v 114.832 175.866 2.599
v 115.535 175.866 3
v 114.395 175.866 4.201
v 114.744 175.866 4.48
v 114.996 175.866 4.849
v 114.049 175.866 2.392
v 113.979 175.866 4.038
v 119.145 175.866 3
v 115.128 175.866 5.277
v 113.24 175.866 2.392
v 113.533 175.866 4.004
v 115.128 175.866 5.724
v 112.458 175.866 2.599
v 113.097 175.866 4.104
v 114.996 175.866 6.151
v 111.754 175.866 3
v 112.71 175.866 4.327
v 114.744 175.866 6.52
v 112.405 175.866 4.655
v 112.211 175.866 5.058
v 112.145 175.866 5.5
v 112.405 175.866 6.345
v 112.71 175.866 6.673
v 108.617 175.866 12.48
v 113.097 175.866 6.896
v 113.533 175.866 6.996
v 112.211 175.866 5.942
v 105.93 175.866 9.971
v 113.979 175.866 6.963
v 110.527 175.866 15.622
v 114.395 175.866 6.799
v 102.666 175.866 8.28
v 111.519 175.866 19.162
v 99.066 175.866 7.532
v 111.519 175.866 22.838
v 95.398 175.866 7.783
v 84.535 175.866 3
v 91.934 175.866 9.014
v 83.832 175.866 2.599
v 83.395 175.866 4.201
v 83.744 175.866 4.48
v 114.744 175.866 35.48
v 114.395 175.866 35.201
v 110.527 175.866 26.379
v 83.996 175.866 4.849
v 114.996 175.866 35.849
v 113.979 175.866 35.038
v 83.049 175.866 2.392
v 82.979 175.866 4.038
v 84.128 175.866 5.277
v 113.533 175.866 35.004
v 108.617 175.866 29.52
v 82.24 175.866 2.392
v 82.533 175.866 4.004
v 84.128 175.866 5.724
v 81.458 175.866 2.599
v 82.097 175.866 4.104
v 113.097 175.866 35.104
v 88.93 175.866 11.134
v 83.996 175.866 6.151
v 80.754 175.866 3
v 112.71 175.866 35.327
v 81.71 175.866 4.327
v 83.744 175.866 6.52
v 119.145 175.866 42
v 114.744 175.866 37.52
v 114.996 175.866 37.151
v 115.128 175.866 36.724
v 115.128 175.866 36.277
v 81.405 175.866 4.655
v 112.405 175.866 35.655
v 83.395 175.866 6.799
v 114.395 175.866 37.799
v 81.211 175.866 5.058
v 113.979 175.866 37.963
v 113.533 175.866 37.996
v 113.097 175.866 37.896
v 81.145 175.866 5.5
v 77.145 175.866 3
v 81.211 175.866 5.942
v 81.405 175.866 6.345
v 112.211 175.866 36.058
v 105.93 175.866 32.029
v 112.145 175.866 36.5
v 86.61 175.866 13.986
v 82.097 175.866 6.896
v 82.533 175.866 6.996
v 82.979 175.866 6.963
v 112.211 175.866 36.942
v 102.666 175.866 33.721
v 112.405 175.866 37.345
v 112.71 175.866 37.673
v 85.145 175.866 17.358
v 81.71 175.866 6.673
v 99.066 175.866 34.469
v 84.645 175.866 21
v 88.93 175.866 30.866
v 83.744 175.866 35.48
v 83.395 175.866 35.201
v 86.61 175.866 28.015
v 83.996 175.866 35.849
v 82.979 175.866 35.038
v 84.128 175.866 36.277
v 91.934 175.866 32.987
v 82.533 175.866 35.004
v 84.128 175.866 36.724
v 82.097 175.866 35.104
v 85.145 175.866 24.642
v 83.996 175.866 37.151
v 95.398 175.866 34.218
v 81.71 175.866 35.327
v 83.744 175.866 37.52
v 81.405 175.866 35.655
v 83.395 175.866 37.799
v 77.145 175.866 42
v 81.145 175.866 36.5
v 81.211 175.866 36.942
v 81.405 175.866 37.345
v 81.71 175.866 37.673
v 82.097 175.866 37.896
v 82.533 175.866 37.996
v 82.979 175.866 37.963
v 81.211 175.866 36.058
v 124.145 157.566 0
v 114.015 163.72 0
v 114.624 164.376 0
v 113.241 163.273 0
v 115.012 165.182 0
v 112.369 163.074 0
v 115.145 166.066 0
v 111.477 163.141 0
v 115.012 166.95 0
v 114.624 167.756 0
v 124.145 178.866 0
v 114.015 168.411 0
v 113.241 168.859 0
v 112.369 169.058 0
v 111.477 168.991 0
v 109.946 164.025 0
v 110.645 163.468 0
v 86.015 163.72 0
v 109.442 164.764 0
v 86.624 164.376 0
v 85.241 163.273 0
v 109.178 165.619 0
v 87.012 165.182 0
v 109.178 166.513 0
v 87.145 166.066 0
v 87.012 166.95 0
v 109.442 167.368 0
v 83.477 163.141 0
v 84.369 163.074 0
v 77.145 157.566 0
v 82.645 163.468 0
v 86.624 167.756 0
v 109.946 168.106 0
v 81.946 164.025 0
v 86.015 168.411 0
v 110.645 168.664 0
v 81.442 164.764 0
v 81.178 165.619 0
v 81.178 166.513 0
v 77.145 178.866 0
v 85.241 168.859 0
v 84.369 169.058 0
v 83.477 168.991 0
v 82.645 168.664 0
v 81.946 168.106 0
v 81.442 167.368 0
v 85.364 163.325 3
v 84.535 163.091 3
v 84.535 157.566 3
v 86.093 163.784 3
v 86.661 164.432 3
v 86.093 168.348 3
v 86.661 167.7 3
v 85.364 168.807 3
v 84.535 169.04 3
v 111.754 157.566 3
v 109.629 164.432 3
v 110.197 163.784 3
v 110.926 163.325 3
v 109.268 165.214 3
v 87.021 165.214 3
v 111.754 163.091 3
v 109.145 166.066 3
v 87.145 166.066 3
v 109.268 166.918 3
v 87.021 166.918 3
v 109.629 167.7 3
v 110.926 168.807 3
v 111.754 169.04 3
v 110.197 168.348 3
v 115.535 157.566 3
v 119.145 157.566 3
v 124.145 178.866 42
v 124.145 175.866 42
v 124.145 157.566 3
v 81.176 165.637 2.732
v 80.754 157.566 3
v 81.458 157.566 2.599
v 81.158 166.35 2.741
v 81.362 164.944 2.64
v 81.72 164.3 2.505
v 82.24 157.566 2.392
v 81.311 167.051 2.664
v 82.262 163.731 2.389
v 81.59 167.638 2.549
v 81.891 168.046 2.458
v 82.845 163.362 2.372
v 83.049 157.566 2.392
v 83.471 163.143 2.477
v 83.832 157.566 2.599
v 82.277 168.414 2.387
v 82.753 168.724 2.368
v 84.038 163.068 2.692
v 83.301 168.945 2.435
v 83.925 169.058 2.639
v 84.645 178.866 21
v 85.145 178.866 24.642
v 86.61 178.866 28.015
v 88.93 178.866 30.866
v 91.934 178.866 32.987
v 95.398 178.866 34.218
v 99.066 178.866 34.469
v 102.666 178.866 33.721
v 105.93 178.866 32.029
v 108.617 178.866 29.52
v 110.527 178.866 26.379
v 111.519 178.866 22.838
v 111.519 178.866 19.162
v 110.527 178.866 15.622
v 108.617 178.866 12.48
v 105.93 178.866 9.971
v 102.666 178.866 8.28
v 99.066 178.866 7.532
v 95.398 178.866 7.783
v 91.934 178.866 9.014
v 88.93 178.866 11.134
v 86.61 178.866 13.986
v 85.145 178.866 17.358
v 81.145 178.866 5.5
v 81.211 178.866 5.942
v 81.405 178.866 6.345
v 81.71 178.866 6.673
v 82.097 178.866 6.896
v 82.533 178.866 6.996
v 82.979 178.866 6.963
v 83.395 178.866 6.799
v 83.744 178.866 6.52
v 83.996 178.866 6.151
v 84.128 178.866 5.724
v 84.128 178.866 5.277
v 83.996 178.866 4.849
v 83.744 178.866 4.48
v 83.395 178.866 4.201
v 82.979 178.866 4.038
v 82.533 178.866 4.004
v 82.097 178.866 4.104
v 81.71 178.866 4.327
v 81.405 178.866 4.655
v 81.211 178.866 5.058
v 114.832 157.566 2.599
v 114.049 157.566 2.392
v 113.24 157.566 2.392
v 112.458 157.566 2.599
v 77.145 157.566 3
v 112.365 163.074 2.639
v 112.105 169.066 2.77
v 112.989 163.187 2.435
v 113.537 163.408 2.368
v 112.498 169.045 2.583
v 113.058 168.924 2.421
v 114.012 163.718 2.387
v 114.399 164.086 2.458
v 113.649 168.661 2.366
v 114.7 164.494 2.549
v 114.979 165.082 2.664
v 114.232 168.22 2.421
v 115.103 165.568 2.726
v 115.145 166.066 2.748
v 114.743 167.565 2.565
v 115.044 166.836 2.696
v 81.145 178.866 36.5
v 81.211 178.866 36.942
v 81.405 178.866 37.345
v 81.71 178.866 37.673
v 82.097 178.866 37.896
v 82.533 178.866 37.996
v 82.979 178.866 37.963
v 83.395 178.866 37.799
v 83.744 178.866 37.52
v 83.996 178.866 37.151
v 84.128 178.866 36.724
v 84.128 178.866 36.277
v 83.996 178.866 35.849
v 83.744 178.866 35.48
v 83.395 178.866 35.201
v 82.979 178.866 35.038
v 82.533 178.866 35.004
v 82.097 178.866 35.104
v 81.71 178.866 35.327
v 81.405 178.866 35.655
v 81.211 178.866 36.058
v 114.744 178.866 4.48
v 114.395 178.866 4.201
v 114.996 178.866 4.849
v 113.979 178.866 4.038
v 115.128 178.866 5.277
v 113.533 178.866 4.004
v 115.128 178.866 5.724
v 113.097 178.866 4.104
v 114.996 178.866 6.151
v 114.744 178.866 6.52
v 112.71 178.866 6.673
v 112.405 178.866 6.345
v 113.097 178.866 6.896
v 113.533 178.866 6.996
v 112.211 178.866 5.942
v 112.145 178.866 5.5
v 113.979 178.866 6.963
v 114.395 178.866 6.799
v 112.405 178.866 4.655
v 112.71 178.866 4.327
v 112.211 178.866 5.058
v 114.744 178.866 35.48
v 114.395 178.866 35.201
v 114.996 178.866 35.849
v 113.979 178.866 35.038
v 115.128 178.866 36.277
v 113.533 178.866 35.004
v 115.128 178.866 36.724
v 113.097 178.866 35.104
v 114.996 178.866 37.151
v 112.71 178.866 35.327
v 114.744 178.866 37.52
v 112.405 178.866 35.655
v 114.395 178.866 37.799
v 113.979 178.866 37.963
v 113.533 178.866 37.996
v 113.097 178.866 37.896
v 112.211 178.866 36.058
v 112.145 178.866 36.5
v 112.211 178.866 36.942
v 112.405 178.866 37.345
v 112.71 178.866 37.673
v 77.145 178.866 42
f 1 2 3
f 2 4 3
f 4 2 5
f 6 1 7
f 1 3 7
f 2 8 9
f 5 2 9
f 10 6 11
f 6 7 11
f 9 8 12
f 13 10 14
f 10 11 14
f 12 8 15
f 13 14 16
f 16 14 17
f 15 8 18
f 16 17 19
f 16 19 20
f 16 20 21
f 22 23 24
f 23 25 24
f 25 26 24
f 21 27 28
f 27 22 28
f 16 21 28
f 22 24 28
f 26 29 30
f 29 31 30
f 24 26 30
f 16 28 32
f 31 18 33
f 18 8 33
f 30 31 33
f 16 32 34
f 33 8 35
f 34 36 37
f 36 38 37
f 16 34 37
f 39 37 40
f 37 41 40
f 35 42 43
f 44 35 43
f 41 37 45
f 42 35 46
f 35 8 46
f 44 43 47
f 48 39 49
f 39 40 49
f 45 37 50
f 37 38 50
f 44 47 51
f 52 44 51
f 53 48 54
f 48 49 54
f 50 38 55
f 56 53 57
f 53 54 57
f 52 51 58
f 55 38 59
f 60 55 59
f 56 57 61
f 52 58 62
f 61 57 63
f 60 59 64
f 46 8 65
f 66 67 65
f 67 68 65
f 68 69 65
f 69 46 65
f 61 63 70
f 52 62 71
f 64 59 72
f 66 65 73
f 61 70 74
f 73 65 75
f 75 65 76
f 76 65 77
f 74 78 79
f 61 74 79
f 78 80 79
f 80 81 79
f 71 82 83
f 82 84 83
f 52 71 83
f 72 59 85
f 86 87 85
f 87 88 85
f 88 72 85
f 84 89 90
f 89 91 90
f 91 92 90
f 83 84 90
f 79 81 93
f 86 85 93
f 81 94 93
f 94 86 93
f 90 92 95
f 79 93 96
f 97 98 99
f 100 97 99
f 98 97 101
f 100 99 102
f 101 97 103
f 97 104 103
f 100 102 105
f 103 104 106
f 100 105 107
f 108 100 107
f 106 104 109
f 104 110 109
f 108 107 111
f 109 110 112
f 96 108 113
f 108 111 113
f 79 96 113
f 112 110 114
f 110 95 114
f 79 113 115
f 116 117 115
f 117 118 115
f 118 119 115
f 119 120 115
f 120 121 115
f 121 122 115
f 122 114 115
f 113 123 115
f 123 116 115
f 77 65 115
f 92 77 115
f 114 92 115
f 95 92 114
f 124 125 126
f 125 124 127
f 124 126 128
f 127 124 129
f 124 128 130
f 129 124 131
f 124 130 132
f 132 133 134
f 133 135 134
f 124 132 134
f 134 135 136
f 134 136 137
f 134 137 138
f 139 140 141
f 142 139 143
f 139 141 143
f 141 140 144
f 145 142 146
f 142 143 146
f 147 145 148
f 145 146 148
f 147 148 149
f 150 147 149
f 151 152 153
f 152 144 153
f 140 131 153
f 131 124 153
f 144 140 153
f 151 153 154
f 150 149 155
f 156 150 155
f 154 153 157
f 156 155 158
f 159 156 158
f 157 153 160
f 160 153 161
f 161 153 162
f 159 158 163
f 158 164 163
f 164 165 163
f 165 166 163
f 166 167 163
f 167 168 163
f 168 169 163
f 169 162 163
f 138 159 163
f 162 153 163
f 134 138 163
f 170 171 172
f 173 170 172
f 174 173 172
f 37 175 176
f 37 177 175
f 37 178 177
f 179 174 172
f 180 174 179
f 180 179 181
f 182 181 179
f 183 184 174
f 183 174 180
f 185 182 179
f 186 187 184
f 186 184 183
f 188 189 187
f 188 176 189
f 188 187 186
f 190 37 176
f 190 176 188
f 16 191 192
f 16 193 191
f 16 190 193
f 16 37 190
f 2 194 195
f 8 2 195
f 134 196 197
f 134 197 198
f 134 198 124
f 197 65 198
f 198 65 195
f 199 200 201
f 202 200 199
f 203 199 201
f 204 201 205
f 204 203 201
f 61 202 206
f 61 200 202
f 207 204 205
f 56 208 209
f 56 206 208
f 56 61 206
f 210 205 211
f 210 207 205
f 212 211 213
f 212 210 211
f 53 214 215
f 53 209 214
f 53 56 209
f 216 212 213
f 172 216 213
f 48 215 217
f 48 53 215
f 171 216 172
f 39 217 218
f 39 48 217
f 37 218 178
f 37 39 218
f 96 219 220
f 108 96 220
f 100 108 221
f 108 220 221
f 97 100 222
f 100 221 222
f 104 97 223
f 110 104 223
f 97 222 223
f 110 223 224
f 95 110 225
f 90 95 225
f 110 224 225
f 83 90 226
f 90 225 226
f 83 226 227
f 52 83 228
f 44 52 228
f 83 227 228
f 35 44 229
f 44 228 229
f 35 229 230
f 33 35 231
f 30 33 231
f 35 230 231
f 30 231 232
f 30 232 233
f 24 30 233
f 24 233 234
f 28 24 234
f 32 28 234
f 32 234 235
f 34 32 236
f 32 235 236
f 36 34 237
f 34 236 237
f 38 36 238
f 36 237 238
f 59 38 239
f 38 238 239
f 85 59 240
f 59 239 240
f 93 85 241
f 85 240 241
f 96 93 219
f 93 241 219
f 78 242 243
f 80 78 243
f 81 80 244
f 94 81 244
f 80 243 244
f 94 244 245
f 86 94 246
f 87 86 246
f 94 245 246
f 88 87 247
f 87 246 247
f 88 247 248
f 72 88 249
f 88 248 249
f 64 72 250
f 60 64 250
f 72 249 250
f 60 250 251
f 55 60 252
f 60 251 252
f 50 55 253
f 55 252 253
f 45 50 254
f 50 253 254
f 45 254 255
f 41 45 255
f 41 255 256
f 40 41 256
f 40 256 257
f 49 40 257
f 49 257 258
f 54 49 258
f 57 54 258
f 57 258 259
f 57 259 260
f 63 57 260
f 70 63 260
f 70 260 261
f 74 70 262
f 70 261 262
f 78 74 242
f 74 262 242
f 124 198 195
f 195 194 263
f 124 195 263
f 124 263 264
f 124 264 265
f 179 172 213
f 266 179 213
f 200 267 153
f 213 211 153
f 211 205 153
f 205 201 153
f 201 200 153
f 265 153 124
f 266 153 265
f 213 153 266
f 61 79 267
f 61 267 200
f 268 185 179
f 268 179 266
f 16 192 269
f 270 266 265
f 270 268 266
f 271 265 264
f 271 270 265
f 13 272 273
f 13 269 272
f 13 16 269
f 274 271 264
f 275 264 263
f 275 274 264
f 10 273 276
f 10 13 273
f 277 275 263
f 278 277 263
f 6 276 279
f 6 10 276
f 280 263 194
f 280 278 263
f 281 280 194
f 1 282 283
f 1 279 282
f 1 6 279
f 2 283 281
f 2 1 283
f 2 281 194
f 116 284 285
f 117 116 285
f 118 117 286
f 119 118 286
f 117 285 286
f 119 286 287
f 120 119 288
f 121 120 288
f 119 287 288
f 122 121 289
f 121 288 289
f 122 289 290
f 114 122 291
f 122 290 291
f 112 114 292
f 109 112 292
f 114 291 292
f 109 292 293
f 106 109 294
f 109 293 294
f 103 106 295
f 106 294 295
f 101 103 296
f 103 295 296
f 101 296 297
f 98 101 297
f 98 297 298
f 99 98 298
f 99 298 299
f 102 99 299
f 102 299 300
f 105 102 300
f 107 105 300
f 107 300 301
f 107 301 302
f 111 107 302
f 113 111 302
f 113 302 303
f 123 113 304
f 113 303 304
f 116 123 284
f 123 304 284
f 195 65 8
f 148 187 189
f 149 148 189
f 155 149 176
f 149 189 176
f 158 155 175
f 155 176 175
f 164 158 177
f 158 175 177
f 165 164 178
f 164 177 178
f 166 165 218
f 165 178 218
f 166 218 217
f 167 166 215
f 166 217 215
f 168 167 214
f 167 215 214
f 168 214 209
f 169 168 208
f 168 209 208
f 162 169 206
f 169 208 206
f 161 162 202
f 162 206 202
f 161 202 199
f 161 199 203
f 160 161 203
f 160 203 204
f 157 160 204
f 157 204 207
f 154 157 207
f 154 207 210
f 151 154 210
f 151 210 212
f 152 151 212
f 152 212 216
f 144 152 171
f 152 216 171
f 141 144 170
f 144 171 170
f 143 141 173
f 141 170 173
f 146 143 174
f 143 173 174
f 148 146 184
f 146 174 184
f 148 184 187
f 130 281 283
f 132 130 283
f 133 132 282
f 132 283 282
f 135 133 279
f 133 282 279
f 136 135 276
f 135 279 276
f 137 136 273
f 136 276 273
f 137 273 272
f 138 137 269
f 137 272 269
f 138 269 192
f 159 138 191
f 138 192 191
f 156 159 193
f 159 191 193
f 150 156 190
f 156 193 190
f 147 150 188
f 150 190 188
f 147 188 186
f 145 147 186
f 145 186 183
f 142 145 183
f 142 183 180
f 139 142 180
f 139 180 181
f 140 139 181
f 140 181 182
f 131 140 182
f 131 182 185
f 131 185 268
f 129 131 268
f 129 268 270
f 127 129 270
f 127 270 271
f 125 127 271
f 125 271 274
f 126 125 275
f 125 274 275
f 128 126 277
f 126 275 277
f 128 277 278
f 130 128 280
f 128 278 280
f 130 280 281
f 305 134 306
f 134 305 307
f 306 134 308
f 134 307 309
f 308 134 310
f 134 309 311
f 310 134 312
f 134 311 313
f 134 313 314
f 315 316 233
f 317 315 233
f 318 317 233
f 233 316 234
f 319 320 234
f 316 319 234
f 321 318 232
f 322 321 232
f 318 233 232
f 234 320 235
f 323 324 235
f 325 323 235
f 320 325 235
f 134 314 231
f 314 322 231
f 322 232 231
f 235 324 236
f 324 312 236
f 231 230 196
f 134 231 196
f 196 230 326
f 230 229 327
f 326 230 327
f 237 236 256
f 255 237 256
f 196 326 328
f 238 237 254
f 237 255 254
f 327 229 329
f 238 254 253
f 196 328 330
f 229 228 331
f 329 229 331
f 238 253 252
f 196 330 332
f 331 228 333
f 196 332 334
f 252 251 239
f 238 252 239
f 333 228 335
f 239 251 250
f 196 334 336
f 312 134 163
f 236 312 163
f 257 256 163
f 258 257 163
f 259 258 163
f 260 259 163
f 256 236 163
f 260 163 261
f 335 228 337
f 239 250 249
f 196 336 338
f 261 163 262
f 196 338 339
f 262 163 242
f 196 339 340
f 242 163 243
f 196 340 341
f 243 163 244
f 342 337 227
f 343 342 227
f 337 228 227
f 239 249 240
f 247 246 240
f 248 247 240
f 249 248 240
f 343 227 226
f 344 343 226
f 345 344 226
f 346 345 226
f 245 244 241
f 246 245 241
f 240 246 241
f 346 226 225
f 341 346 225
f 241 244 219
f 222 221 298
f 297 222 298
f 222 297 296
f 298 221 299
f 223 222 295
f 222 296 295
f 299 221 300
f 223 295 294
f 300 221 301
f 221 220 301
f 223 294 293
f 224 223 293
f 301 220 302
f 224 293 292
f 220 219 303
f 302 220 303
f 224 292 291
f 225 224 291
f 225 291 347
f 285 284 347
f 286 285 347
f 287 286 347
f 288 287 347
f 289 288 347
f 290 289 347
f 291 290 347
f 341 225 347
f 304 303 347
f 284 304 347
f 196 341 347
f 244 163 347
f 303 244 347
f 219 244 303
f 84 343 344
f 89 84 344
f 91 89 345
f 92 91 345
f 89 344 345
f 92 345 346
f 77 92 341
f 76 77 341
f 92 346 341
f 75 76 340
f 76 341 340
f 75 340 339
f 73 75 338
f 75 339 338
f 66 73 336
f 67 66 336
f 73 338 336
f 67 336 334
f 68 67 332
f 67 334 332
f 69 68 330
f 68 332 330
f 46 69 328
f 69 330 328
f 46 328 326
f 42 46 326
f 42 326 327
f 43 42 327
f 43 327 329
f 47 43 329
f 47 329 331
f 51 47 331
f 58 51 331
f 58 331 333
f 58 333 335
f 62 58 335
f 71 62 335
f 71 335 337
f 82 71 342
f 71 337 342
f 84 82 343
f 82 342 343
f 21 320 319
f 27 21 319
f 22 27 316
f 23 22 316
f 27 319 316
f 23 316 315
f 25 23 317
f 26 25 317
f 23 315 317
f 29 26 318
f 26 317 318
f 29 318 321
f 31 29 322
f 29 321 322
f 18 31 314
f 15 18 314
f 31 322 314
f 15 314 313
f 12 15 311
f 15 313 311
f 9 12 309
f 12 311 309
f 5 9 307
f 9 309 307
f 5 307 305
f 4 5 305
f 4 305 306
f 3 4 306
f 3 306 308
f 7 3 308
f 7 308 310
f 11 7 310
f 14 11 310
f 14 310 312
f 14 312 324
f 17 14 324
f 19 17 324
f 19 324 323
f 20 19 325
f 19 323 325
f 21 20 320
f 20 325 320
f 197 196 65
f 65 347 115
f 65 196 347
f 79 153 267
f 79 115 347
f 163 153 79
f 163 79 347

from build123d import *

# Parameters (mm, degrees)
SKETCH1_W           = 42
SKETCH1_H           = 21.3
BOSS_EXTRUDE1_DEPTH = 3
SKETCH2_R           = 3
CUT_EXTRUDE1_DEPTH  = 3
SKETCH4_W           = 42
SKETCH4_H           = 42
SKETCH4_R           = 1.5
SKETCH4_R_2         = 13.5
BOSS_EXTRUDE2_DEPTH = 3
BOSS_EXTRUDE3_DEPTH = 5
SKETCH6_R           = 3.134349401
CUT_EXTRUDE2_DEPTH  = 20


with BuildPart() as part:
    # Sketch1 → Boss-Extrude1 (new body)
    with BuildSketch(Plane.XY):
        with Locations((98.144783915, 168.215968794)):
            Rectangle(SKETCH1_W, SKETCH1_H)
    extrude(amount=BOSS_EXTRUDE1_DEPTH)

    # Sketch2 → Cut-Extrude1 (cut)
    with BuildSketch(Plane.XY.offset(3)):
        with Locations((112.144783915, 166.065968794)):
            Circle(SKETCH2_R)
        with Locations((84.144783915, 166.065968794)):
            Circle(SKETCH2_R)
    extrude(amount=-CUT_EXTRUDE1_DEPTH, mode=Mode.SUBTRACT)

    # Sketch4 → Boss-Extrude2 (add)
    with BuildSketch(Plane(origin=(0, 178.865968794, 0), x_dir=(-1, 0, 0), z_dir=(0, 1, 0))):
        with Locations((-98.144783915, 21)):
            Rectangle(SKETCH4_W, SKETCH4_H)
        with Locations((-113.644783915, 36.500179206)):
            Circle(SKETCH4_R, mode=Mode.SUBTRACT)
        with Locations((-82.644783915, 36.500179206)):
            Circle(SKETCH4_R, mode=Mode.SUBTRACT)
        with Locations((-82.644783915, 5.500179206)):
            Circle(SKETCH4_R, mode=Mode.SUBTRACT)
        with Locations((-113.644783915, 5.500179206)):
            Circle(SKETCH4_R, mode=Mode.SUBTRACT)
        with Locations((-98.144783915, 21.000179206)):
            Circle(SKETCH4_R_2, mode=Mode.SUBTRACT)
    extrude(amount=-BOSS_EXTRUDE2_DEPTH)

    # Sketch5 → Boss-Extrude3 (add)
    with BuildSketch(Plane(origin=(119.144783915, 0, 0), x_dir=(0, 0, -1), z_dir=(1, 0, 0))):
        Polygon((0, 157.565968794), (0, 178.865968794), (-42, 178.865968794), (-42, 175.865968794), (-3, 157.565968794), align=None)
    extrude(amount=BOSS_EXTRUDE3_DEPTH)

    # Sketch6 → Cut-Extrude2 (cut)
    with BuildSketch(Plane.XZ.offset(-175.865968794)):
        with Locations((82.644783915, 5.500179206)):
            Circle(SKETCH6_R)
        with Locations((113.644783915, 5.500179206)):
            Circle(SKETCH6_R)
    extrude(amount=CUT_EXTRUDE2_DEPTH, mode=Mode.SUBTRACT)


solid = part.part
